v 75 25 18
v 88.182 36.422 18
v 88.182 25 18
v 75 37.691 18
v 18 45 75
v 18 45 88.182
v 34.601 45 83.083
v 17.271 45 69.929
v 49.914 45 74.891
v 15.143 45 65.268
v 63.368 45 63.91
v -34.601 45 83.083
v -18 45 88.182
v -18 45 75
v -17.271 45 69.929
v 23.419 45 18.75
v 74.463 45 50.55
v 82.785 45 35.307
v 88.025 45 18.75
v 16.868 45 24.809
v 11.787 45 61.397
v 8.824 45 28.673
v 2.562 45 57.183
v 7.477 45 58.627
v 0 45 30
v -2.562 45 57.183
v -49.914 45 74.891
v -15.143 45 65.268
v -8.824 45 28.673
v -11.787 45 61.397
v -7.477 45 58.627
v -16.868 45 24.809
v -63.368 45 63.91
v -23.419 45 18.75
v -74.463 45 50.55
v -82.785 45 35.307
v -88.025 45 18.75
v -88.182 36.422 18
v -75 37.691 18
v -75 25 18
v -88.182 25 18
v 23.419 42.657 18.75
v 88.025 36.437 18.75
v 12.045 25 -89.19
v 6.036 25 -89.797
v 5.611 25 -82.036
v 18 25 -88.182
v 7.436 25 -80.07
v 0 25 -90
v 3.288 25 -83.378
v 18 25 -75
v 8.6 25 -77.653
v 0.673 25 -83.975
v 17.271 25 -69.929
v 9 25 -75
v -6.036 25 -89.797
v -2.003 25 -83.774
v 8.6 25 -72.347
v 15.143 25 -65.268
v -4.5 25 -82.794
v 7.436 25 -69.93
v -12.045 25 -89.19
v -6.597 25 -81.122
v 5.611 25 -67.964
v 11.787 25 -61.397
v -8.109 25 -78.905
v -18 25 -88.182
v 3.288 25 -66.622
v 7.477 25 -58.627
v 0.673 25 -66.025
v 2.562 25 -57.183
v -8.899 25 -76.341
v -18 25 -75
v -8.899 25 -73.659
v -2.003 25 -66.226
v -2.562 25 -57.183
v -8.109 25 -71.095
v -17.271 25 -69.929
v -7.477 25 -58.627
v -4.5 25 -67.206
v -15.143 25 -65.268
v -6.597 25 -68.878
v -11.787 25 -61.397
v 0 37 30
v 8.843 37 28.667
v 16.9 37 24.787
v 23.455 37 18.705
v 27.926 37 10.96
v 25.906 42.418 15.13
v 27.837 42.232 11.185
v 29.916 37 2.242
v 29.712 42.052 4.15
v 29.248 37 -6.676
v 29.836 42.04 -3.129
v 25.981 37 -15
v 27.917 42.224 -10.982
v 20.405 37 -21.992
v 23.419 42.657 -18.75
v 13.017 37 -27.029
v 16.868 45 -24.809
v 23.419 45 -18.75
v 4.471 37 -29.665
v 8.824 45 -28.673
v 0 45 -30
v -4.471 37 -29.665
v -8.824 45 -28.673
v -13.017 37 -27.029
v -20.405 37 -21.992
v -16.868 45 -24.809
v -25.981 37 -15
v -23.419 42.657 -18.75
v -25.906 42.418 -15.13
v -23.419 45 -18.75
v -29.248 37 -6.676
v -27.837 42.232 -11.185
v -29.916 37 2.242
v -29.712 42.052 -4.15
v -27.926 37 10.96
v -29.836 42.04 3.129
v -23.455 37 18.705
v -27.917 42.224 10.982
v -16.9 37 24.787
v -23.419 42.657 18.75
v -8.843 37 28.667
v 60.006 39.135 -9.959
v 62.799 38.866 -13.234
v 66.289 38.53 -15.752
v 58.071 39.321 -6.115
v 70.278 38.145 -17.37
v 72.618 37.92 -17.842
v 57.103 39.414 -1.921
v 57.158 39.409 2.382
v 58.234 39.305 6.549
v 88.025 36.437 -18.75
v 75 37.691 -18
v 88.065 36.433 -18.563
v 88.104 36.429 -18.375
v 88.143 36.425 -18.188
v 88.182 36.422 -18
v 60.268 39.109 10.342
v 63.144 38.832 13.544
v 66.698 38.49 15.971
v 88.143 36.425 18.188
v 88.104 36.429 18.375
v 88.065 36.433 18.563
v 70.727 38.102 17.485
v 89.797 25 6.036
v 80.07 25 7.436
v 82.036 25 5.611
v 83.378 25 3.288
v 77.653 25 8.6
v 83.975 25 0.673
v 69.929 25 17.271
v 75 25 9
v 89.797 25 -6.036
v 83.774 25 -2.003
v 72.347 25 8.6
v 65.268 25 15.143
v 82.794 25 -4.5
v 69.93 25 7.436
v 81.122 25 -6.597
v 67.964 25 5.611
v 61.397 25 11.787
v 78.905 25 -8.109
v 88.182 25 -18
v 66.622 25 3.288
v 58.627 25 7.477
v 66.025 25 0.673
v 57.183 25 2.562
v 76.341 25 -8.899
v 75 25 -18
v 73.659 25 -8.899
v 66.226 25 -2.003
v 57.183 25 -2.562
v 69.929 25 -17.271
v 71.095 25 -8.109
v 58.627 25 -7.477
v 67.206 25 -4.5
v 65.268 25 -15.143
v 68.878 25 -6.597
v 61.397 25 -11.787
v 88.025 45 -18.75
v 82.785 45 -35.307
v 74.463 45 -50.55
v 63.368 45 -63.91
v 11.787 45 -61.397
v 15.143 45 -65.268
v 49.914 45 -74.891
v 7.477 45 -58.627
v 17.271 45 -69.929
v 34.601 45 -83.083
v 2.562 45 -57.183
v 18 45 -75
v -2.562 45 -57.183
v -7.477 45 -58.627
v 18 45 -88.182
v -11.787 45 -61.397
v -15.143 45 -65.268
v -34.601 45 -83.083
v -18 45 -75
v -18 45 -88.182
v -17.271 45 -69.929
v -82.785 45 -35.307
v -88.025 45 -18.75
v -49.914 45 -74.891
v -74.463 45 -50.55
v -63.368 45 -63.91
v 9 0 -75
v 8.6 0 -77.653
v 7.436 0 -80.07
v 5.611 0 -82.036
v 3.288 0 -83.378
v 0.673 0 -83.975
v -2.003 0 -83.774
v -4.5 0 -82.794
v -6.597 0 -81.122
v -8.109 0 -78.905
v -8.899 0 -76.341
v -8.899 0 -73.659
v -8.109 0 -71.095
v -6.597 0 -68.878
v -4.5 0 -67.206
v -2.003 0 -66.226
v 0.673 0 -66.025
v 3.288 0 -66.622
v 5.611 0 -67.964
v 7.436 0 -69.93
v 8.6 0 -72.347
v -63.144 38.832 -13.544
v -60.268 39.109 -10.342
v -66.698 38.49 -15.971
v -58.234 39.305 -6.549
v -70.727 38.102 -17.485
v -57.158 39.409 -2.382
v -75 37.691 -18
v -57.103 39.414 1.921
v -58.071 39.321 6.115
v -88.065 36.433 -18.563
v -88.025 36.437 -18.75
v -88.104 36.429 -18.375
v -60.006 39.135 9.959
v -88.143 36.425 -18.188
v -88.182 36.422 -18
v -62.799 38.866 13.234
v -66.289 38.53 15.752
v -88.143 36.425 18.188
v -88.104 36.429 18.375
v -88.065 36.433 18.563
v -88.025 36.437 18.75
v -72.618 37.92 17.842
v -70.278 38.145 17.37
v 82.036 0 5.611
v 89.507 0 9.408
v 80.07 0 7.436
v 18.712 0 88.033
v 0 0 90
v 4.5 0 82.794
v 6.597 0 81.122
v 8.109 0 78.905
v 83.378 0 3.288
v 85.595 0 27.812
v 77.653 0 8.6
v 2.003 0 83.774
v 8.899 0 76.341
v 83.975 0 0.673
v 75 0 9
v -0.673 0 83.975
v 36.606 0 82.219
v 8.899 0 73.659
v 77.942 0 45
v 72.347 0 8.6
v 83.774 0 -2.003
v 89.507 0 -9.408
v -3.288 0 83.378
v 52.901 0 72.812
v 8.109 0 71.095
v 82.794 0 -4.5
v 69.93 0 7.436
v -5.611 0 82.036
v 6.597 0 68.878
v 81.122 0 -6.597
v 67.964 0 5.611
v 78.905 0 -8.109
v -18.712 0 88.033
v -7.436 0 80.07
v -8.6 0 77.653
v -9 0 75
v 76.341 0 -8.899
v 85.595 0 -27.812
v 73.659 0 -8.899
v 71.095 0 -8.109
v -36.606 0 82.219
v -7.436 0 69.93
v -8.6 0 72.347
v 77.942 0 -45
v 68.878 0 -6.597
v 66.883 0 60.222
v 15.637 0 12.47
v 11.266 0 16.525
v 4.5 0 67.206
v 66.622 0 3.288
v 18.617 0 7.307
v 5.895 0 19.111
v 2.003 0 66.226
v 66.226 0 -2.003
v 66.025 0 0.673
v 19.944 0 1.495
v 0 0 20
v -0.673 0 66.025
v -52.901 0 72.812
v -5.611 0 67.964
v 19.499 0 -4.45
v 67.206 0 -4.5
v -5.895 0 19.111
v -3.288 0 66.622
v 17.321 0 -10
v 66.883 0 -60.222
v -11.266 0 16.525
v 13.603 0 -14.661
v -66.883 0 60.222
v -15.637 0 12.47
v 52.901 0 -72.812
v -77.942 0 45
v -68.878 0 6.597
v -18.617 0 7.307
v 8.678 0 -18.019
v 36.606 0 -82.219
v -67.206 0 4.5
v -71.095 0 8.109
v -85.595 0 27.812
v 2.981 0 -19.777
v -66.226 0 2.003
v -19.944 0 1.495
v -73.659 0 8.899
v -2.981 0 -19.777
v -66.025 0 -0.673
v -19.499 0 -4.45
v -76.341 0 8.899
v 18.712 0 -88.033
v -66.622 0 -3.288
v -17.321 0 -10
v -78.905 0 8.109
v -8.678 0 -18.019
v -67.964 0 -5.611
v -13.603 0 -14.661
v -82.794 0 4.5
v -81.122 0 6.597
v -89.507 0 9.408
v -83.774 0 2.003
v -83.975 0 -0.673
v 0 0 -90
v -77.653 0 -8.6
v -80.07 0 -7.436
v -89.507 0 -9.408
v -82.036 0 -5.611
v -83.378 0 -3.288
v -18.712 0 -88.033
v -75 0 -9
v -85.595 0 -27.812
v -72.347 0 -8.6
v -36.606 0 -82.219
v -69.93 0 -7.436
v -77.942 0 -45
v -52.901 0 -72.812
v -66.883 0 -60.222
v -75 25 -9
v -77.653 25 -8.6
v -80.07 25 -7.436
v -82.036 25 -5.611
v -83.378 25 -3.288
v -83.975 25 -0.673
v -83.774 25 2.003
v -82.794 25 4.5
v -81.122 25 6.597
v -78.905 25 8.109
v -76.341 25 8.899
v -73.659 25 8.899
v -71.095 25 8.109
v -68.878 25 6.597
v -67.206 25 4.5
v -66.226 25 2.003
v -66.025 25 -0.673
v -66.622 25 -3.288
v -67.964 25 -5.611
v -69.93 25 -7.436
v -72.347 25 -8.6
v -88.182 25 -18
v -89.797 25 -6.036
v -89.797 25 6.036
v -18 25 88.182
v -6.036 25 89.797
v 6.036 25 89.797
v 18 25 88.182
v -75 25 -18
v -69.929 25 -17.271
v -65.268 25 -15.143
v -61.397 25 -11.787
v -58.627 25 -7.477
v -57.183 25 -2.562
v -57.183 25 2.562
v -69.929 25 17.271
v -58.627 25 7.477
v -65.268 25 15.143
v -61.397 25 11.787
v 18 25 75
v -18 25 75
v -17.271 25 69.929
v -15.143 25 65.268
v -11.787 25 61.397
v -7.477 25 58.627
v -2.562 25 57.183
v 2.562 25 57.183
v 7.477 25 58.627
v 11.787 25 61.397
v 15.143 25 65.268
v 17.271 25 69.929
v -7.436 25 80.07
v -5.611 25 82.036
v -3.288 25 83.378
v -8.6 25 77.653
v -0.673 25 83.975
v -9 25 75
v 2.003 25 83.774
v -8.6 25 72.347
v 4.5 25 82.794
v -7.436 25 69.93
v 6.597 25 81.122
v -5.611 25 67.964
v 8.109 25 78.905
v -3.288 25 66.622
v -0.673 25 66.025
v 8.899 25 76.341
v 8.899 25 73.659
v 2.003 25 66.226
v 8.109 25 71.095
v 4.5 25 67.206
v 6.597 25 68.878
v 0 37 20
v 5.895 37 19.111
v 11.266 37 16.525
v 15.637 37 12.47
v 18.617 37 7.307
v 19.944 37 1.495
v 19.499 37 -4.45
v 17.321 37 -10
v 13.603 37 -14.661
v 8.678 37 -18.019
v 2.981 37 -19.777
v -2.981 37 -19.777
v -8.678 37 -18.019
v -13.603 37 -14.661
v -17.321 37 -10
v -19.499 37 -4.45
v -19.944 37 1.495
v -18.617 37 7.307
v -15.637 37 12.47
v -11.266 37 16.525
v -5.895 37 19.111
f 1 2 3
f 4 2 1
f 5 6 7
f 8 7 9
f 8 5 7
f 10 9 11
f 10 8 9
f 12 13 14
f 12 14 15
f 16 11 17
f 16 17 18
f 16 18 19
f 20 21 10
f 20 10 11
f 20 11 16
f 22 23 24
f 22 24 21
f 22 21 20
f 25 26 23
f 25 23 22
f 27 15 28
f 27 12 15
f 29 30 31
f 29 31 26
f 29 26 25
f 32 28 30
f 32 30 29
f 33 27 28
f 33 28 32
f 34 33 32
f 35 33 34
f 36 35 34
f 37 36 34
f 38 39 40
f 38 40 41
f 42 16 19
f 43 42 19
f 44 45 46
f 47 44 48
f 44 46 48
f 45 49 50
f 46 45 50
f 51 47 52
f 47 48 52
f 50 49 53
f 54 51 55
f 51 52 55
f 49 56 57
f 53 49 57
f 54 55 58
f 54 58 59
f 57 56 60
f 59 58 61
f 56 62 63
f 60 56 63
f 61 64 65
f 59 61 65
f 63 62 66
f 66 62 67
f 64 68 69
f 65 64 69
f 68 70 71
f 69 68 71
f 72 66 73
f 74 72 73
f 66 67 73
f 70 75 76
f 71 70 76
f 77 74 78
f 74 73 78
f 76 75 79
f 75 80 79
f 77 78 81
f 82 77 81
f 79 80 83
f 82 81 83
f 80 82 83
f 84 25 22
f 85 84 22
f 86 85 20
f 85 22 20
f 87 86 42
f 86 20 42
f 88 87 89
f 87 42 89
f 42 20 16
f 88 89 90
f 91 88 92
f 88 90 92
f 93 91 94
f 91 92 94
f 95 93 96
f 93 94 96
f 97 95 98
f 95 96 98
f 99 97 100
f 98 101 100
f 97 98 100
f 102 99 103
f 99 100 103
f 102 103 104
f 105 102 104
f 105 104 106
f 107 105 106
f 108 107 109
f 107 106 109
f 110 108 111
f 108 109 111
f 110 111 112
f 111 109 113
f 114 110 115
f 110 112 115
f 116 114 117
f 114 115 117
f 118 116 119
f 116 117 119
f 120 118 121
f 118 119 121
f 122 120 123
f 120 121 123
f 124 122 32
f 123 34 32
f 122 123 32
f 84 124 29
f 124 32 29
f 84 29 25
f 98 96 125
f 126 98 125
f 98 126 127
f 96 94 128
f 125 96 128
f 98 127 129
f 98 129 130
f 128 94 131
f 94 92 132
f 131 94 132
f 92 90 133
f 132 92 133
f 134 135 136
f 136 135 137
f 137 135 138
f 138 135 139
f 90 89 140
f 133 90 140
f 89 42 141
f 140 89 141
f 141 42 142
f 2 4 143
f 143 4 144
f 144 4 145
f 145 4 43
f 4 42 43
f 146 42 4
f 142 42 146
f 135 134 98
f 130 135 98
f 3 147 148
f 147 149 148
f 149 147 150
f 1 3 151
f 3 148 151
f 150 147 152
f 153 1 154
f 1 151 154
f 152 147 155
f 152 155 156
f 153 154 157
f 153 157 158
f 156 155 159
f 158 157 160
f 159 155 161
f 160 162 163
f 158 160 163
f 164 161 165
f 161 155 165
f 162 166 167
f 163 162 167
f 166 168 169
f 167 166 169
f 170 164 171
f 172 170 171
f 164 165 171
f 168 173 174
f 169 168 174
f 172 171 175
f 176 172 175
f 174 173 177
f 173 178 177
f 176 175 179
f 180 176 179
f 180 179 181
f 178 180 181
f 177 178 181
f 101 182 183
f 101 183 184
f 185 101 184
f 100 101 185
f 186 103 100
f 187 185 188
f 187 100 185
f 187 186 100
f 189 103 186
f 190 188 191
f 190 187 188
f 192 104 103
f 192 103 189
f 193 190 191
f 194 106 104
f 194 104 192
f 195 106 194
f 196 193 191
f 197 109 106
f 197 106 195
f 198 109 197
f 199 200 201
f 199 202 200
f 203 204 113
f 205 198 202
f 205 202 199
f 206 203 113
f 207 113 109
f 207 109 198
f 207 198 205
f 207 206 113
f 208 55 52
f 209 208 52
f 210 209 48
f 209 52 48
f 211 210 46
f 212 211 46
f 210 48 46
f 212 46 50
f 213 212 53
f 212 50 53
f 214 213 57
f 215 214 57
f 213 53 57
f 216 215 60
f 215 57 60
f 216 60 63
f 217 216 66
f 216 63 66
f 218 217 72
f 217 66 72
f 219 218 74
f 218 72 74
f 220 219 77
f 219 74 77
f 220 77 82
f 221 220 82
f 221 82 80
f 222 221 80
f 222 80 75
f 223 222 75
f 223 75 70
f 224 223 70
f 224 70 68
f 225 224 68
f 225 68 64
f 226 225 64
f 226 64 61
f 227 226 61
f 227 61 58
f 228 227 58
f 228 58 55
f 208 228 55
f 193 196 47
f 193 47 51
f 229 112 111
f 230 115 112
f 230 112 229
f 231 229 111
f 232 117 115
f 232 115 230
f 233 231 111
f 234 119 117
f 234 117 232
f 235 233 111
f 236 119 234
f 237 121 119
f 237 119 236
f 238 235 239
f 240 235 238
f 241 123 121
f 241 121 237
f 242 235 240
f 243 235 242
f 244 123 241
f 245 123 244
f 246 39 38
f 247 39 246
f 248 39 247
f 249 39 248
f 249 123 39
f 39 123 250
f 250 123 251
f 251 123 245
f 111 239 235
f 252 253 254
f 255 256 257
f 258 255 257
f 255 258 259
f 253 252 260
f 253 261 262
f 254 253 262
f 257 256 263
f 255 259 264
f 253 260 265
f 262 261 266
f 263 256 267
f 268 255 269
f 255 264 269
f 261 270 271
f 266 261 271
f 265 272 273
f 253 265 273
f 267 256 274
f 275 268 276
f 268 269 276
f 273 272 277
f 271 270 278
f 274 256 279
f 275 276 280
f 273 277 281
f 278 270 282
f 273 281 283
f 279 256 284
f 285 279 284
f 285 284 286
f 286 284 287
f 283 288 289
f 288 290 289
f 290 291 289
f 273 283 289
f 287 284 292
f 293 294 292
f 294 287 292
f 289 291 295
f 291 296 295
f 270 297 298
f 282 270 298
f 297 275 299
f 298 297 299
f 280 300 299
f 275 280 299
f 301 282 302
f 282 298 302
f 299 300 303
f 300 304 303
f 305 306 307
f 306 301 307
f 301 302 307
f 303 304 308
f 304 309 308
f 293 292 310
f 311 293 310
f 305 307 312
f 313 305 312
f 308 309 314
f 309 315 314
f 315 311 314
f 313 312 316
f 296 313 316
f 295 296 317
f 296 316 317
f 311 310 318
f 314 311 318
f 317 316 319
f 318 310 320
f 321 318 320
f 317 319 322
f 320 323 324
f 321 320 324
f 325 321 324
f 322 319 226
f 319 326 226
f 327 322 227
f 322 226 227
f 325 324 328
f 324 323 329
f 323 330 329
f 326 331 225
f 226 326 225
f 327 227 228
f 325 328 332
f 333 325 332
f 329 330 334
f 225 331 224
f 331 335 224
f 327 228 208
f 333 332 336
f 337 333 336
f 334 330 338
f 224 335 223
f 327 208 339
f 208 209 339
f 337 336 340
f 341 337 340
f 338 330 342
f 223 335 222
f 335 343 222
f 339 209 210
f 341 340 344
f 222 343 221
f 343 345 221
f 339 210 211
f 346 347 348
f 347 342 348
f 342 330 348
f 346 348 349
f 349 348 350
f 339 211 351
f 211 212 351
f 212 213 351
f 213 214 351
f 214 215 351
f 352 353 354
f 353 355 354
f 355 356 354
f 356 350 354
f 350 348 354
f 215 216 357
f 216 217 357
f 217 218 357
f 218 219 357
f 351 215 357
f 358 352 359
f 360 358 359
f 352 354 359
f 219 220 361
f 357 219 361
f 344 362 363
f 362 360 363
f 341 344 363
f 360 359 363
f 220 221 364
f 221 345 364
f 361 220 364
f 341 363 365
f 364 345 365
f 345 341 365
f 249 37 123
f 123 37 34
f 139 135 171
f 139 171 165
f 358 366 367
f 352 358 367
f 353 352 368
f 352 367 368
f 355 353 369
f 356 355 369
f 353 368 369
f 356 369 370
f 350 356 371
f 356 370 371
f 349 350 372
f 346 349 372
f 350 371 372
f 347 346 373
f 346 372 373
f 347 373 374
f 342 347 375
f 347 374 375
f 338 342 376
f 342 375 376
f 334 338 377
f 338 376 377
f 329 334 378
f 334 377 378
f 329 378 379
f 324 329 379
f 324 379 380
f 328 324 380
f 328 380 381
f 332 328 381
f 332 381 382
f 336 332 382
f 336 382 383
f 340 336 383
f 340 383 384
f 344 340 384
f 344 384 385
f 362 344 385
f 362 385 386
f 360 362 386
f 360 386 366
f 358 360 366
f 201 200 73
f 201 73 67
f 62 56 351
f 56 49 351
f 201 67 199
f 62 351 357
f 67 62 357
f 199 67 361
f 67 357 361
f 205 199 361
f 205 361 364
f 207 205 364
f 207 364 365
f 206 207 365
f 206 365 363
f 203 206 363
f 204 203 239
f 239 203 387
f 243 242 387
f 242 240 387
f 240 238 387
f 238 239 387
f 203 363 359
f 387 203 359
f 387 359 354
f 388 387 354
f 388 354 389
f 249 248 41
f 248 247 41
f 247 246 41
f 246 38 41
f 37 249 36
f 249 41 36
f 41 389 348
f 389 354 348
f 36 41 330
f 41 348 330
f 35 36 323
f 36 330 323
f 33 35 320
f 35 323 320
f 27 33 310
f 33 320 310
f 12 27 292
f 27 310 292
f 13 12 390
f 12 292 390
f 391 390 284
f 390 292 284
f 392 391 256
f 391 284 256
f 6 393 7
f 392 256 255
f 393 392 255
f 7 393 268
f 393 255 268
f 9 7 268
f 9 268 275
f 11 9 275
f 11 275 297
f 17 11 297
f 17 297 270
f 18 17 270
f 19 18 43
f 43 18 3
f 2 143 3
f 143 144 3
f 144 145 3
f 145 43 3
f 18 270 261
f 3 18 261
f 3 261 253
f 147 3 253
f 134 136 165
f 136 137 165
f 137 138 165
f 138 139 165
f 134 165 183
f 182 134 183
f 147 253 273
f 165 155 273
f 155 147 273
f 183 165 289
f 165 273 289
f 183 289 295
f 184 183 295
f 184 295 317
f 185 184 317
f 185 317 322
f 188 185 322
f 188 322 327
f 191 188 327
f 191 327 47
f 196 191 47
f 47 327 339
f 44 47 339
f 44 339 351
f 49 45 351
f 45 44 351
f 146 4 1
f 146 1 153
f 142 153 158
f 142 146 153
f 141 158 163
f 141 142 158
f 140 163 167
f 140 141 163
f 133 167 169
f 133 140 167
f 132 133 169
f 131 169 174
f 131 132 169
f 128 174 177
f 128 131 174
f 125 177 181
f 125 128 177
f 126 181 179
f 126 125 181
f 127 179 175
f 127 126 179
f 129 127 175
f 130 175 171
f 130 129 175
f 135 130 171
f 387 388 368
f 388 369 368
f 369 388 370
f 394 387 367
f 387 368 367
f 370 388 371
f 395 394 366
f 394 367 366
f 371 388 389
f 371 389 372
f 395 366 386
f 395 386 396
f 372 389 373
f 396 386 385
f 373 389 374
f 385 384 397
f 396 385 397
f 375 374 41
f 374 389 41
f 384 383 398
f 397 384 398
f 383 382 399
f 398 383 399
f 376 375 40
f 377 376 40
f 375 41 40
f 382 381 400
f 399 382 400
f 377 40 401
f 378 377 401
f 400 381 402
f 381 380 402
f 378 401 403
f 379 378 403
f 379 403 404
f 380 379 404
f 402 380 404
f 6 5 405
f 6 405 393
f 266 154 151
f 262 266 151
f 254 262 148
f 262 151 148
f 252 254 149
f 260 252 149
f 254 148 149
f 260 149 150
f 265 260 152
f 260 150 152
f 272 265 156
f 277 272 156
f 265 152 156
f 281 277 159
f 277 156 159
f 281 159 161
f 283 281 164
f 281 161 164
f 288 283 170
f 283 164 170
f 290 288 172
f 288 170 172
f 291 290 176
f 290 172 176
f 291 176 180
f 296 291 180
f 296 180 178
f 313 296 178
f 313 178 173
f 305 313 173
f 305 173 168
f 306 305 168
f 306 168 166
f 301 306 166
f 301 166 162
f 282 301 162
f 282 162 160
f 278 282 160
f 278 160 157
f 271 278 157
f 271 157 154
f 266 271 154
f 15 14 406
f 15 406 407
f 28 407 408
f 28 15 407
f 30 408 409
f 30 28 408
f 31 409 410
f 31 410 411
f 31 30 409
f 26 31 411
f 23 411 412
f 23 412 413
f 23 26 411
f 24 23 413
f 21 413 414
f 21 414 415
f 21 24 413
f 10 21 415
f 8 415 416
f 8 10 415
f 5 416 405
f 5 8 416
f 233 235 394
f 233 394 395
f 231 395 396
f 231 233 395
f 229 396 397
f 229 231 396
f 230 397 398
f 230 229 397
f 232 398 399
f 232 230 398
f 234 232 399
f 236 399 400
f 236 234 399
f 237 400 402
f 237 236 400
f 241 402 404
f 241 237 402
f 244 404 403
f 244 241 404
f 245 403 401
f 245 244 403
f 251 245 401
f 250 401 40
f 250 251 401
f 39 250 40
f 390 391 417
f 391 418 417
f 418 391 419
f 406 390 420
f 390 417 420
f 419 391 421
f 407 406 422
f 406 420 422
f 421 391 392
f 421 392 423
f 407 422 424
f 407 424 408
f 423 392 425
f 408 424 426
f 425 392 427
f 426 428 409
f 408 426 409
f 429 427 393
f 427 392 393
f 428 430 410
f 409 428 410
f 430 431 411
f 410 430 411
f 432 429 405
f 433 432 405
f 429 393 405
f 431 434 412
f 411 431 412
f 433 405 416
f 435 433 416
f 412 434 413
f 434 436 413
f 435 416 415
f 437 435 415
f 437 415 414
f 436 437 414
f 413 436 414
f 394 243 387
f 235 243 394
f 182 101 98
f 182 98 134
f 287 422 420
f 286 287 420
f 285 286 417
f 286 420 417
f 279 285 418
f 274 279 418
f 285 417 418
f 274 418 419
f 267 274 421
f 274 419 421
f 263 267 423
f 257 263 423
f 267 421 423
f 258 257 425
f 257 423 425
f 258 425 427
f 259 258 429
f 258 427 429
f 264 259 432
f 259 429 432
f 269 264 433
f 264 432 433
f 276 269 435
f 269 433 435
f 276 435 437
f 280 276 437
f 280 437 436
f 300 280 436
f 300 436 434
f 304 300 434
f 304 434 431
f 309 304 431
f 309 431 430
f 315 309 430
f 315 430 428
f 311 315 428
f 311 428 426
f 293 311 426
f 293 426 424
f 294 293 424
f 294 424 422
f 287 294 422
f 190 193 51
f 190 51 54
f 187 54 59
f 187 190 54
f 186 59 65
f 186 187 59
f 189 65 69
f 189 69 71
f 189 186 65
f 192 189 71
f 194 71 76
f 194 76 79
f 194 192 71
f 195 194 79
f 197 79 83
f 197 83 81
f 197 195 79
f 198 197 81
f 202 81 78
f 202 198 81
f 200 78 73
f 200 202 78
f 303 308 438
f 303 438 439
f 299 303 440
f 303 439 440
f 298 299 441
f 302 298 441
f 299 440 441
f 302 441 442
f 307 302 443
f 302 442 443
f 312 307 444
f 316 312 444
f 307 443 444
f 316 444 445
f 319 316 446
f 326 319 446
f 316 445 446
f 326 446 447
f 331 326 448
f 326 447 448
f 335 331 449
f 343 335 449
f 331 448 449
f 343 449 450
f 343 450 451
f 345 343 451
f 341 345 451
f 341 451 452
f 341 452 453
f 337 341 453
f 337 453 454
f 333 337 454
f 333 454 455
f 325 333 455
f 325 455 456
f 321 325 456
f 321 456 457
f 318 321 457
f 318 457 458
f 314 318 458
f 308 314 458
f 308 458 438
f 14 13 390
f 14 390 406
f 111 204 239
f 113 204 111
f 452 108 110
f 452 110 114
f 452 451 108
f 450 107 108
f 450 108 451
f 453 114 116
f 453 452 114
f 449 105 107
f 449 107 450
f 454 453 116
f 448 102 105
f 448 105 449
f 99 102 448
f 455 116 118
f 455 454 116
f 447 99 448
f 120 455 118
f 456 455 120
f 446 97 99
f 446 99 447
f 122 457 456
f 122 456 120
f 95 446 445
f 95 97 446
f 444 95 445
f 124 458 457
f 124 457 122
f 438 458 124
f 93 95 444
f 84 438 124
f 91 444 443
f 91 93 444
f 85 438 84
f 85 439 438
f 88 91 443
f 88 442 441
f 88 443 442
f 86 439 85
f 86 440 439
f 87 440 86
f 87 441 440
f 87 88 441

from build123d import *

# Parameters (mm, degrees)
ESQUISSE1_R                  = 90
BOSS_EXTRU_1_DEPTH           = 45
ESQUISSE2_R                  = 9
ENL_V_MAT_EXTRU_1_DEPTH      = 45
ESQUISSE2_3_R                = 9
ENL_V_MAT_EXTRU_2_DEPTH      = 20
ENL_V_MAT_EXTRU_3_DEPTH      = 18.75
R_P_TITION_CIRCULAIRE2_COUNT = 4
ESQUISSE4_R                  = 30
ENL_V_MAT_EXTRU_4_DEPTH      = 8
ESQUISSE4_3_R                = 20
ENL_V_MAT_EXTRU_5_DEPTH      = 136


with BuildPart() as part:
    # Esquisse1 → Boss.-Extru.1 (new body)
    with BuildSketch(Plane(origin=(0, 0, 0), x_dir=(1, 0, 0), z_dir=(0, 1, 0))):
        Circle(ESQUISSE1_R)
    extrude(amount=BOSS_EXTRU_1_DEPTH)

    # Esquisse2 → Enlèv. mat.-Extru.1 (cut)
    with BuildSketch(Plane(origin=(0, 45, 0), x_dir=(1, 0, 0), z_dir=(0, 1, 0))):
        with Locations((75, 0)):
            Circle(ESQUISSE2_R)
    enl_v_mat_extru_1 = extrude(amount=-ENL_V_MAT_EXTRU_1_DEPTH, mode=Mode.SUBTRACT)

    # Esquisse2<3> → Enlèv. mat.-Extru.2 (cut)
    with BuildSketch(Plane(origin=(0, 45, 0), x_dir=(1, 0, 0), z_dir=(0, 1, 0))):
        with BuildLine():
            Line((75, 18), (115, 18))
            ThreePointArc((115, 18), (133, 0), (115, -18))
            Line((115, -18), (75, -18))
            ThreePointArc((75, -18), (57, 0), (75, 18))
        make_face()
        with Locations((75, 0)):
            Circle(ESQUISSE2_3_R, mode=Mode.SUBTRACT)
    enl_v_mat_extru_2 = extrude(amount=-ENL_V_MAT_EXTRU_2_DEPTH, mode=Mode.SUBTRACT)

    # Esquisse3 → Enlèv. mat.-Extru.3 (cut, symmetric)
    with BuildSketch(Plane.XY):
        Polygon((-0.90918463, 45), (101.87081537, 35.103411626), (101.87081537, 45), align=None)
    enl_v_mat_extru_3 = extrude(amount=ENL_V_MAT_EXTRU_3_DEPTH, both=True, mode=Mode.SUBTRACT)

    # Symétrie1: Enlèv. mat.-Extru.3 across plane
    add(enl_v_mat_extru_3.mirror(Plane(origin=(0, 0, 0), x_dir=(0, 0, 1), z_dir=(1, 0, 0))), mode=Mode.SUBTRACT)

    # Répétition circulaire2: Enlèv. mat.-Extru.1, Enlèv. mat.-Extru.2 ×4 about axis
    r_p_tition_circulaire2_axis = Axis((0, 0, 0), (0, 1, 0))
    add([enl_v_mat_extru_1.rotate(r_p_tition_circulaire2_axis, i * 360 / R_P_TITION_CIRCULAIRE2_COUNT) for i in range(1, R_P_TITION_CIRCULAIRE2_COUNT)], mode=Mode.SUBTRACT)
    add([enl_v_mat_extru_2.rotate(r_p_tition_circulaire2_axis, i * 360 / R_P_TITION_CIRCULAIRE2_COUNT) for i in range(1, R_P_TITION_CIRCULAIRE2_COUNT)], mode=Mode.SUBTRACT)

    # Esquisse4 → Enlèv. mat.-Extru.4 (cut, symmetric)
    with BuildSketch(Plane(origin=(0, 45, 0), x_dir=(1, 0, 0), z_dir=(0, 1, 0))):
        Circle(ESQUISSE4_R)
    extrude(amount=ENL_V_MAT_EXTRU_4_DEPTH, both=True, mode=Mode.SUBTRACT)

    # Esquisse4<3> → Enlèv. mat.-Extru.5 (cut, through all)
    with BuildSketch(Plane(origin=(0, 45, 0), x_dir=(1, 0, 0), z_dir=(0, 1, 0))):
        Circle(ESQUISSE4_3_R)
    extrude(amount=-ENL_V_MAT_EXTRU_5_DEPTH, mode=Mode.SUBTRACT)


solid = part.part
